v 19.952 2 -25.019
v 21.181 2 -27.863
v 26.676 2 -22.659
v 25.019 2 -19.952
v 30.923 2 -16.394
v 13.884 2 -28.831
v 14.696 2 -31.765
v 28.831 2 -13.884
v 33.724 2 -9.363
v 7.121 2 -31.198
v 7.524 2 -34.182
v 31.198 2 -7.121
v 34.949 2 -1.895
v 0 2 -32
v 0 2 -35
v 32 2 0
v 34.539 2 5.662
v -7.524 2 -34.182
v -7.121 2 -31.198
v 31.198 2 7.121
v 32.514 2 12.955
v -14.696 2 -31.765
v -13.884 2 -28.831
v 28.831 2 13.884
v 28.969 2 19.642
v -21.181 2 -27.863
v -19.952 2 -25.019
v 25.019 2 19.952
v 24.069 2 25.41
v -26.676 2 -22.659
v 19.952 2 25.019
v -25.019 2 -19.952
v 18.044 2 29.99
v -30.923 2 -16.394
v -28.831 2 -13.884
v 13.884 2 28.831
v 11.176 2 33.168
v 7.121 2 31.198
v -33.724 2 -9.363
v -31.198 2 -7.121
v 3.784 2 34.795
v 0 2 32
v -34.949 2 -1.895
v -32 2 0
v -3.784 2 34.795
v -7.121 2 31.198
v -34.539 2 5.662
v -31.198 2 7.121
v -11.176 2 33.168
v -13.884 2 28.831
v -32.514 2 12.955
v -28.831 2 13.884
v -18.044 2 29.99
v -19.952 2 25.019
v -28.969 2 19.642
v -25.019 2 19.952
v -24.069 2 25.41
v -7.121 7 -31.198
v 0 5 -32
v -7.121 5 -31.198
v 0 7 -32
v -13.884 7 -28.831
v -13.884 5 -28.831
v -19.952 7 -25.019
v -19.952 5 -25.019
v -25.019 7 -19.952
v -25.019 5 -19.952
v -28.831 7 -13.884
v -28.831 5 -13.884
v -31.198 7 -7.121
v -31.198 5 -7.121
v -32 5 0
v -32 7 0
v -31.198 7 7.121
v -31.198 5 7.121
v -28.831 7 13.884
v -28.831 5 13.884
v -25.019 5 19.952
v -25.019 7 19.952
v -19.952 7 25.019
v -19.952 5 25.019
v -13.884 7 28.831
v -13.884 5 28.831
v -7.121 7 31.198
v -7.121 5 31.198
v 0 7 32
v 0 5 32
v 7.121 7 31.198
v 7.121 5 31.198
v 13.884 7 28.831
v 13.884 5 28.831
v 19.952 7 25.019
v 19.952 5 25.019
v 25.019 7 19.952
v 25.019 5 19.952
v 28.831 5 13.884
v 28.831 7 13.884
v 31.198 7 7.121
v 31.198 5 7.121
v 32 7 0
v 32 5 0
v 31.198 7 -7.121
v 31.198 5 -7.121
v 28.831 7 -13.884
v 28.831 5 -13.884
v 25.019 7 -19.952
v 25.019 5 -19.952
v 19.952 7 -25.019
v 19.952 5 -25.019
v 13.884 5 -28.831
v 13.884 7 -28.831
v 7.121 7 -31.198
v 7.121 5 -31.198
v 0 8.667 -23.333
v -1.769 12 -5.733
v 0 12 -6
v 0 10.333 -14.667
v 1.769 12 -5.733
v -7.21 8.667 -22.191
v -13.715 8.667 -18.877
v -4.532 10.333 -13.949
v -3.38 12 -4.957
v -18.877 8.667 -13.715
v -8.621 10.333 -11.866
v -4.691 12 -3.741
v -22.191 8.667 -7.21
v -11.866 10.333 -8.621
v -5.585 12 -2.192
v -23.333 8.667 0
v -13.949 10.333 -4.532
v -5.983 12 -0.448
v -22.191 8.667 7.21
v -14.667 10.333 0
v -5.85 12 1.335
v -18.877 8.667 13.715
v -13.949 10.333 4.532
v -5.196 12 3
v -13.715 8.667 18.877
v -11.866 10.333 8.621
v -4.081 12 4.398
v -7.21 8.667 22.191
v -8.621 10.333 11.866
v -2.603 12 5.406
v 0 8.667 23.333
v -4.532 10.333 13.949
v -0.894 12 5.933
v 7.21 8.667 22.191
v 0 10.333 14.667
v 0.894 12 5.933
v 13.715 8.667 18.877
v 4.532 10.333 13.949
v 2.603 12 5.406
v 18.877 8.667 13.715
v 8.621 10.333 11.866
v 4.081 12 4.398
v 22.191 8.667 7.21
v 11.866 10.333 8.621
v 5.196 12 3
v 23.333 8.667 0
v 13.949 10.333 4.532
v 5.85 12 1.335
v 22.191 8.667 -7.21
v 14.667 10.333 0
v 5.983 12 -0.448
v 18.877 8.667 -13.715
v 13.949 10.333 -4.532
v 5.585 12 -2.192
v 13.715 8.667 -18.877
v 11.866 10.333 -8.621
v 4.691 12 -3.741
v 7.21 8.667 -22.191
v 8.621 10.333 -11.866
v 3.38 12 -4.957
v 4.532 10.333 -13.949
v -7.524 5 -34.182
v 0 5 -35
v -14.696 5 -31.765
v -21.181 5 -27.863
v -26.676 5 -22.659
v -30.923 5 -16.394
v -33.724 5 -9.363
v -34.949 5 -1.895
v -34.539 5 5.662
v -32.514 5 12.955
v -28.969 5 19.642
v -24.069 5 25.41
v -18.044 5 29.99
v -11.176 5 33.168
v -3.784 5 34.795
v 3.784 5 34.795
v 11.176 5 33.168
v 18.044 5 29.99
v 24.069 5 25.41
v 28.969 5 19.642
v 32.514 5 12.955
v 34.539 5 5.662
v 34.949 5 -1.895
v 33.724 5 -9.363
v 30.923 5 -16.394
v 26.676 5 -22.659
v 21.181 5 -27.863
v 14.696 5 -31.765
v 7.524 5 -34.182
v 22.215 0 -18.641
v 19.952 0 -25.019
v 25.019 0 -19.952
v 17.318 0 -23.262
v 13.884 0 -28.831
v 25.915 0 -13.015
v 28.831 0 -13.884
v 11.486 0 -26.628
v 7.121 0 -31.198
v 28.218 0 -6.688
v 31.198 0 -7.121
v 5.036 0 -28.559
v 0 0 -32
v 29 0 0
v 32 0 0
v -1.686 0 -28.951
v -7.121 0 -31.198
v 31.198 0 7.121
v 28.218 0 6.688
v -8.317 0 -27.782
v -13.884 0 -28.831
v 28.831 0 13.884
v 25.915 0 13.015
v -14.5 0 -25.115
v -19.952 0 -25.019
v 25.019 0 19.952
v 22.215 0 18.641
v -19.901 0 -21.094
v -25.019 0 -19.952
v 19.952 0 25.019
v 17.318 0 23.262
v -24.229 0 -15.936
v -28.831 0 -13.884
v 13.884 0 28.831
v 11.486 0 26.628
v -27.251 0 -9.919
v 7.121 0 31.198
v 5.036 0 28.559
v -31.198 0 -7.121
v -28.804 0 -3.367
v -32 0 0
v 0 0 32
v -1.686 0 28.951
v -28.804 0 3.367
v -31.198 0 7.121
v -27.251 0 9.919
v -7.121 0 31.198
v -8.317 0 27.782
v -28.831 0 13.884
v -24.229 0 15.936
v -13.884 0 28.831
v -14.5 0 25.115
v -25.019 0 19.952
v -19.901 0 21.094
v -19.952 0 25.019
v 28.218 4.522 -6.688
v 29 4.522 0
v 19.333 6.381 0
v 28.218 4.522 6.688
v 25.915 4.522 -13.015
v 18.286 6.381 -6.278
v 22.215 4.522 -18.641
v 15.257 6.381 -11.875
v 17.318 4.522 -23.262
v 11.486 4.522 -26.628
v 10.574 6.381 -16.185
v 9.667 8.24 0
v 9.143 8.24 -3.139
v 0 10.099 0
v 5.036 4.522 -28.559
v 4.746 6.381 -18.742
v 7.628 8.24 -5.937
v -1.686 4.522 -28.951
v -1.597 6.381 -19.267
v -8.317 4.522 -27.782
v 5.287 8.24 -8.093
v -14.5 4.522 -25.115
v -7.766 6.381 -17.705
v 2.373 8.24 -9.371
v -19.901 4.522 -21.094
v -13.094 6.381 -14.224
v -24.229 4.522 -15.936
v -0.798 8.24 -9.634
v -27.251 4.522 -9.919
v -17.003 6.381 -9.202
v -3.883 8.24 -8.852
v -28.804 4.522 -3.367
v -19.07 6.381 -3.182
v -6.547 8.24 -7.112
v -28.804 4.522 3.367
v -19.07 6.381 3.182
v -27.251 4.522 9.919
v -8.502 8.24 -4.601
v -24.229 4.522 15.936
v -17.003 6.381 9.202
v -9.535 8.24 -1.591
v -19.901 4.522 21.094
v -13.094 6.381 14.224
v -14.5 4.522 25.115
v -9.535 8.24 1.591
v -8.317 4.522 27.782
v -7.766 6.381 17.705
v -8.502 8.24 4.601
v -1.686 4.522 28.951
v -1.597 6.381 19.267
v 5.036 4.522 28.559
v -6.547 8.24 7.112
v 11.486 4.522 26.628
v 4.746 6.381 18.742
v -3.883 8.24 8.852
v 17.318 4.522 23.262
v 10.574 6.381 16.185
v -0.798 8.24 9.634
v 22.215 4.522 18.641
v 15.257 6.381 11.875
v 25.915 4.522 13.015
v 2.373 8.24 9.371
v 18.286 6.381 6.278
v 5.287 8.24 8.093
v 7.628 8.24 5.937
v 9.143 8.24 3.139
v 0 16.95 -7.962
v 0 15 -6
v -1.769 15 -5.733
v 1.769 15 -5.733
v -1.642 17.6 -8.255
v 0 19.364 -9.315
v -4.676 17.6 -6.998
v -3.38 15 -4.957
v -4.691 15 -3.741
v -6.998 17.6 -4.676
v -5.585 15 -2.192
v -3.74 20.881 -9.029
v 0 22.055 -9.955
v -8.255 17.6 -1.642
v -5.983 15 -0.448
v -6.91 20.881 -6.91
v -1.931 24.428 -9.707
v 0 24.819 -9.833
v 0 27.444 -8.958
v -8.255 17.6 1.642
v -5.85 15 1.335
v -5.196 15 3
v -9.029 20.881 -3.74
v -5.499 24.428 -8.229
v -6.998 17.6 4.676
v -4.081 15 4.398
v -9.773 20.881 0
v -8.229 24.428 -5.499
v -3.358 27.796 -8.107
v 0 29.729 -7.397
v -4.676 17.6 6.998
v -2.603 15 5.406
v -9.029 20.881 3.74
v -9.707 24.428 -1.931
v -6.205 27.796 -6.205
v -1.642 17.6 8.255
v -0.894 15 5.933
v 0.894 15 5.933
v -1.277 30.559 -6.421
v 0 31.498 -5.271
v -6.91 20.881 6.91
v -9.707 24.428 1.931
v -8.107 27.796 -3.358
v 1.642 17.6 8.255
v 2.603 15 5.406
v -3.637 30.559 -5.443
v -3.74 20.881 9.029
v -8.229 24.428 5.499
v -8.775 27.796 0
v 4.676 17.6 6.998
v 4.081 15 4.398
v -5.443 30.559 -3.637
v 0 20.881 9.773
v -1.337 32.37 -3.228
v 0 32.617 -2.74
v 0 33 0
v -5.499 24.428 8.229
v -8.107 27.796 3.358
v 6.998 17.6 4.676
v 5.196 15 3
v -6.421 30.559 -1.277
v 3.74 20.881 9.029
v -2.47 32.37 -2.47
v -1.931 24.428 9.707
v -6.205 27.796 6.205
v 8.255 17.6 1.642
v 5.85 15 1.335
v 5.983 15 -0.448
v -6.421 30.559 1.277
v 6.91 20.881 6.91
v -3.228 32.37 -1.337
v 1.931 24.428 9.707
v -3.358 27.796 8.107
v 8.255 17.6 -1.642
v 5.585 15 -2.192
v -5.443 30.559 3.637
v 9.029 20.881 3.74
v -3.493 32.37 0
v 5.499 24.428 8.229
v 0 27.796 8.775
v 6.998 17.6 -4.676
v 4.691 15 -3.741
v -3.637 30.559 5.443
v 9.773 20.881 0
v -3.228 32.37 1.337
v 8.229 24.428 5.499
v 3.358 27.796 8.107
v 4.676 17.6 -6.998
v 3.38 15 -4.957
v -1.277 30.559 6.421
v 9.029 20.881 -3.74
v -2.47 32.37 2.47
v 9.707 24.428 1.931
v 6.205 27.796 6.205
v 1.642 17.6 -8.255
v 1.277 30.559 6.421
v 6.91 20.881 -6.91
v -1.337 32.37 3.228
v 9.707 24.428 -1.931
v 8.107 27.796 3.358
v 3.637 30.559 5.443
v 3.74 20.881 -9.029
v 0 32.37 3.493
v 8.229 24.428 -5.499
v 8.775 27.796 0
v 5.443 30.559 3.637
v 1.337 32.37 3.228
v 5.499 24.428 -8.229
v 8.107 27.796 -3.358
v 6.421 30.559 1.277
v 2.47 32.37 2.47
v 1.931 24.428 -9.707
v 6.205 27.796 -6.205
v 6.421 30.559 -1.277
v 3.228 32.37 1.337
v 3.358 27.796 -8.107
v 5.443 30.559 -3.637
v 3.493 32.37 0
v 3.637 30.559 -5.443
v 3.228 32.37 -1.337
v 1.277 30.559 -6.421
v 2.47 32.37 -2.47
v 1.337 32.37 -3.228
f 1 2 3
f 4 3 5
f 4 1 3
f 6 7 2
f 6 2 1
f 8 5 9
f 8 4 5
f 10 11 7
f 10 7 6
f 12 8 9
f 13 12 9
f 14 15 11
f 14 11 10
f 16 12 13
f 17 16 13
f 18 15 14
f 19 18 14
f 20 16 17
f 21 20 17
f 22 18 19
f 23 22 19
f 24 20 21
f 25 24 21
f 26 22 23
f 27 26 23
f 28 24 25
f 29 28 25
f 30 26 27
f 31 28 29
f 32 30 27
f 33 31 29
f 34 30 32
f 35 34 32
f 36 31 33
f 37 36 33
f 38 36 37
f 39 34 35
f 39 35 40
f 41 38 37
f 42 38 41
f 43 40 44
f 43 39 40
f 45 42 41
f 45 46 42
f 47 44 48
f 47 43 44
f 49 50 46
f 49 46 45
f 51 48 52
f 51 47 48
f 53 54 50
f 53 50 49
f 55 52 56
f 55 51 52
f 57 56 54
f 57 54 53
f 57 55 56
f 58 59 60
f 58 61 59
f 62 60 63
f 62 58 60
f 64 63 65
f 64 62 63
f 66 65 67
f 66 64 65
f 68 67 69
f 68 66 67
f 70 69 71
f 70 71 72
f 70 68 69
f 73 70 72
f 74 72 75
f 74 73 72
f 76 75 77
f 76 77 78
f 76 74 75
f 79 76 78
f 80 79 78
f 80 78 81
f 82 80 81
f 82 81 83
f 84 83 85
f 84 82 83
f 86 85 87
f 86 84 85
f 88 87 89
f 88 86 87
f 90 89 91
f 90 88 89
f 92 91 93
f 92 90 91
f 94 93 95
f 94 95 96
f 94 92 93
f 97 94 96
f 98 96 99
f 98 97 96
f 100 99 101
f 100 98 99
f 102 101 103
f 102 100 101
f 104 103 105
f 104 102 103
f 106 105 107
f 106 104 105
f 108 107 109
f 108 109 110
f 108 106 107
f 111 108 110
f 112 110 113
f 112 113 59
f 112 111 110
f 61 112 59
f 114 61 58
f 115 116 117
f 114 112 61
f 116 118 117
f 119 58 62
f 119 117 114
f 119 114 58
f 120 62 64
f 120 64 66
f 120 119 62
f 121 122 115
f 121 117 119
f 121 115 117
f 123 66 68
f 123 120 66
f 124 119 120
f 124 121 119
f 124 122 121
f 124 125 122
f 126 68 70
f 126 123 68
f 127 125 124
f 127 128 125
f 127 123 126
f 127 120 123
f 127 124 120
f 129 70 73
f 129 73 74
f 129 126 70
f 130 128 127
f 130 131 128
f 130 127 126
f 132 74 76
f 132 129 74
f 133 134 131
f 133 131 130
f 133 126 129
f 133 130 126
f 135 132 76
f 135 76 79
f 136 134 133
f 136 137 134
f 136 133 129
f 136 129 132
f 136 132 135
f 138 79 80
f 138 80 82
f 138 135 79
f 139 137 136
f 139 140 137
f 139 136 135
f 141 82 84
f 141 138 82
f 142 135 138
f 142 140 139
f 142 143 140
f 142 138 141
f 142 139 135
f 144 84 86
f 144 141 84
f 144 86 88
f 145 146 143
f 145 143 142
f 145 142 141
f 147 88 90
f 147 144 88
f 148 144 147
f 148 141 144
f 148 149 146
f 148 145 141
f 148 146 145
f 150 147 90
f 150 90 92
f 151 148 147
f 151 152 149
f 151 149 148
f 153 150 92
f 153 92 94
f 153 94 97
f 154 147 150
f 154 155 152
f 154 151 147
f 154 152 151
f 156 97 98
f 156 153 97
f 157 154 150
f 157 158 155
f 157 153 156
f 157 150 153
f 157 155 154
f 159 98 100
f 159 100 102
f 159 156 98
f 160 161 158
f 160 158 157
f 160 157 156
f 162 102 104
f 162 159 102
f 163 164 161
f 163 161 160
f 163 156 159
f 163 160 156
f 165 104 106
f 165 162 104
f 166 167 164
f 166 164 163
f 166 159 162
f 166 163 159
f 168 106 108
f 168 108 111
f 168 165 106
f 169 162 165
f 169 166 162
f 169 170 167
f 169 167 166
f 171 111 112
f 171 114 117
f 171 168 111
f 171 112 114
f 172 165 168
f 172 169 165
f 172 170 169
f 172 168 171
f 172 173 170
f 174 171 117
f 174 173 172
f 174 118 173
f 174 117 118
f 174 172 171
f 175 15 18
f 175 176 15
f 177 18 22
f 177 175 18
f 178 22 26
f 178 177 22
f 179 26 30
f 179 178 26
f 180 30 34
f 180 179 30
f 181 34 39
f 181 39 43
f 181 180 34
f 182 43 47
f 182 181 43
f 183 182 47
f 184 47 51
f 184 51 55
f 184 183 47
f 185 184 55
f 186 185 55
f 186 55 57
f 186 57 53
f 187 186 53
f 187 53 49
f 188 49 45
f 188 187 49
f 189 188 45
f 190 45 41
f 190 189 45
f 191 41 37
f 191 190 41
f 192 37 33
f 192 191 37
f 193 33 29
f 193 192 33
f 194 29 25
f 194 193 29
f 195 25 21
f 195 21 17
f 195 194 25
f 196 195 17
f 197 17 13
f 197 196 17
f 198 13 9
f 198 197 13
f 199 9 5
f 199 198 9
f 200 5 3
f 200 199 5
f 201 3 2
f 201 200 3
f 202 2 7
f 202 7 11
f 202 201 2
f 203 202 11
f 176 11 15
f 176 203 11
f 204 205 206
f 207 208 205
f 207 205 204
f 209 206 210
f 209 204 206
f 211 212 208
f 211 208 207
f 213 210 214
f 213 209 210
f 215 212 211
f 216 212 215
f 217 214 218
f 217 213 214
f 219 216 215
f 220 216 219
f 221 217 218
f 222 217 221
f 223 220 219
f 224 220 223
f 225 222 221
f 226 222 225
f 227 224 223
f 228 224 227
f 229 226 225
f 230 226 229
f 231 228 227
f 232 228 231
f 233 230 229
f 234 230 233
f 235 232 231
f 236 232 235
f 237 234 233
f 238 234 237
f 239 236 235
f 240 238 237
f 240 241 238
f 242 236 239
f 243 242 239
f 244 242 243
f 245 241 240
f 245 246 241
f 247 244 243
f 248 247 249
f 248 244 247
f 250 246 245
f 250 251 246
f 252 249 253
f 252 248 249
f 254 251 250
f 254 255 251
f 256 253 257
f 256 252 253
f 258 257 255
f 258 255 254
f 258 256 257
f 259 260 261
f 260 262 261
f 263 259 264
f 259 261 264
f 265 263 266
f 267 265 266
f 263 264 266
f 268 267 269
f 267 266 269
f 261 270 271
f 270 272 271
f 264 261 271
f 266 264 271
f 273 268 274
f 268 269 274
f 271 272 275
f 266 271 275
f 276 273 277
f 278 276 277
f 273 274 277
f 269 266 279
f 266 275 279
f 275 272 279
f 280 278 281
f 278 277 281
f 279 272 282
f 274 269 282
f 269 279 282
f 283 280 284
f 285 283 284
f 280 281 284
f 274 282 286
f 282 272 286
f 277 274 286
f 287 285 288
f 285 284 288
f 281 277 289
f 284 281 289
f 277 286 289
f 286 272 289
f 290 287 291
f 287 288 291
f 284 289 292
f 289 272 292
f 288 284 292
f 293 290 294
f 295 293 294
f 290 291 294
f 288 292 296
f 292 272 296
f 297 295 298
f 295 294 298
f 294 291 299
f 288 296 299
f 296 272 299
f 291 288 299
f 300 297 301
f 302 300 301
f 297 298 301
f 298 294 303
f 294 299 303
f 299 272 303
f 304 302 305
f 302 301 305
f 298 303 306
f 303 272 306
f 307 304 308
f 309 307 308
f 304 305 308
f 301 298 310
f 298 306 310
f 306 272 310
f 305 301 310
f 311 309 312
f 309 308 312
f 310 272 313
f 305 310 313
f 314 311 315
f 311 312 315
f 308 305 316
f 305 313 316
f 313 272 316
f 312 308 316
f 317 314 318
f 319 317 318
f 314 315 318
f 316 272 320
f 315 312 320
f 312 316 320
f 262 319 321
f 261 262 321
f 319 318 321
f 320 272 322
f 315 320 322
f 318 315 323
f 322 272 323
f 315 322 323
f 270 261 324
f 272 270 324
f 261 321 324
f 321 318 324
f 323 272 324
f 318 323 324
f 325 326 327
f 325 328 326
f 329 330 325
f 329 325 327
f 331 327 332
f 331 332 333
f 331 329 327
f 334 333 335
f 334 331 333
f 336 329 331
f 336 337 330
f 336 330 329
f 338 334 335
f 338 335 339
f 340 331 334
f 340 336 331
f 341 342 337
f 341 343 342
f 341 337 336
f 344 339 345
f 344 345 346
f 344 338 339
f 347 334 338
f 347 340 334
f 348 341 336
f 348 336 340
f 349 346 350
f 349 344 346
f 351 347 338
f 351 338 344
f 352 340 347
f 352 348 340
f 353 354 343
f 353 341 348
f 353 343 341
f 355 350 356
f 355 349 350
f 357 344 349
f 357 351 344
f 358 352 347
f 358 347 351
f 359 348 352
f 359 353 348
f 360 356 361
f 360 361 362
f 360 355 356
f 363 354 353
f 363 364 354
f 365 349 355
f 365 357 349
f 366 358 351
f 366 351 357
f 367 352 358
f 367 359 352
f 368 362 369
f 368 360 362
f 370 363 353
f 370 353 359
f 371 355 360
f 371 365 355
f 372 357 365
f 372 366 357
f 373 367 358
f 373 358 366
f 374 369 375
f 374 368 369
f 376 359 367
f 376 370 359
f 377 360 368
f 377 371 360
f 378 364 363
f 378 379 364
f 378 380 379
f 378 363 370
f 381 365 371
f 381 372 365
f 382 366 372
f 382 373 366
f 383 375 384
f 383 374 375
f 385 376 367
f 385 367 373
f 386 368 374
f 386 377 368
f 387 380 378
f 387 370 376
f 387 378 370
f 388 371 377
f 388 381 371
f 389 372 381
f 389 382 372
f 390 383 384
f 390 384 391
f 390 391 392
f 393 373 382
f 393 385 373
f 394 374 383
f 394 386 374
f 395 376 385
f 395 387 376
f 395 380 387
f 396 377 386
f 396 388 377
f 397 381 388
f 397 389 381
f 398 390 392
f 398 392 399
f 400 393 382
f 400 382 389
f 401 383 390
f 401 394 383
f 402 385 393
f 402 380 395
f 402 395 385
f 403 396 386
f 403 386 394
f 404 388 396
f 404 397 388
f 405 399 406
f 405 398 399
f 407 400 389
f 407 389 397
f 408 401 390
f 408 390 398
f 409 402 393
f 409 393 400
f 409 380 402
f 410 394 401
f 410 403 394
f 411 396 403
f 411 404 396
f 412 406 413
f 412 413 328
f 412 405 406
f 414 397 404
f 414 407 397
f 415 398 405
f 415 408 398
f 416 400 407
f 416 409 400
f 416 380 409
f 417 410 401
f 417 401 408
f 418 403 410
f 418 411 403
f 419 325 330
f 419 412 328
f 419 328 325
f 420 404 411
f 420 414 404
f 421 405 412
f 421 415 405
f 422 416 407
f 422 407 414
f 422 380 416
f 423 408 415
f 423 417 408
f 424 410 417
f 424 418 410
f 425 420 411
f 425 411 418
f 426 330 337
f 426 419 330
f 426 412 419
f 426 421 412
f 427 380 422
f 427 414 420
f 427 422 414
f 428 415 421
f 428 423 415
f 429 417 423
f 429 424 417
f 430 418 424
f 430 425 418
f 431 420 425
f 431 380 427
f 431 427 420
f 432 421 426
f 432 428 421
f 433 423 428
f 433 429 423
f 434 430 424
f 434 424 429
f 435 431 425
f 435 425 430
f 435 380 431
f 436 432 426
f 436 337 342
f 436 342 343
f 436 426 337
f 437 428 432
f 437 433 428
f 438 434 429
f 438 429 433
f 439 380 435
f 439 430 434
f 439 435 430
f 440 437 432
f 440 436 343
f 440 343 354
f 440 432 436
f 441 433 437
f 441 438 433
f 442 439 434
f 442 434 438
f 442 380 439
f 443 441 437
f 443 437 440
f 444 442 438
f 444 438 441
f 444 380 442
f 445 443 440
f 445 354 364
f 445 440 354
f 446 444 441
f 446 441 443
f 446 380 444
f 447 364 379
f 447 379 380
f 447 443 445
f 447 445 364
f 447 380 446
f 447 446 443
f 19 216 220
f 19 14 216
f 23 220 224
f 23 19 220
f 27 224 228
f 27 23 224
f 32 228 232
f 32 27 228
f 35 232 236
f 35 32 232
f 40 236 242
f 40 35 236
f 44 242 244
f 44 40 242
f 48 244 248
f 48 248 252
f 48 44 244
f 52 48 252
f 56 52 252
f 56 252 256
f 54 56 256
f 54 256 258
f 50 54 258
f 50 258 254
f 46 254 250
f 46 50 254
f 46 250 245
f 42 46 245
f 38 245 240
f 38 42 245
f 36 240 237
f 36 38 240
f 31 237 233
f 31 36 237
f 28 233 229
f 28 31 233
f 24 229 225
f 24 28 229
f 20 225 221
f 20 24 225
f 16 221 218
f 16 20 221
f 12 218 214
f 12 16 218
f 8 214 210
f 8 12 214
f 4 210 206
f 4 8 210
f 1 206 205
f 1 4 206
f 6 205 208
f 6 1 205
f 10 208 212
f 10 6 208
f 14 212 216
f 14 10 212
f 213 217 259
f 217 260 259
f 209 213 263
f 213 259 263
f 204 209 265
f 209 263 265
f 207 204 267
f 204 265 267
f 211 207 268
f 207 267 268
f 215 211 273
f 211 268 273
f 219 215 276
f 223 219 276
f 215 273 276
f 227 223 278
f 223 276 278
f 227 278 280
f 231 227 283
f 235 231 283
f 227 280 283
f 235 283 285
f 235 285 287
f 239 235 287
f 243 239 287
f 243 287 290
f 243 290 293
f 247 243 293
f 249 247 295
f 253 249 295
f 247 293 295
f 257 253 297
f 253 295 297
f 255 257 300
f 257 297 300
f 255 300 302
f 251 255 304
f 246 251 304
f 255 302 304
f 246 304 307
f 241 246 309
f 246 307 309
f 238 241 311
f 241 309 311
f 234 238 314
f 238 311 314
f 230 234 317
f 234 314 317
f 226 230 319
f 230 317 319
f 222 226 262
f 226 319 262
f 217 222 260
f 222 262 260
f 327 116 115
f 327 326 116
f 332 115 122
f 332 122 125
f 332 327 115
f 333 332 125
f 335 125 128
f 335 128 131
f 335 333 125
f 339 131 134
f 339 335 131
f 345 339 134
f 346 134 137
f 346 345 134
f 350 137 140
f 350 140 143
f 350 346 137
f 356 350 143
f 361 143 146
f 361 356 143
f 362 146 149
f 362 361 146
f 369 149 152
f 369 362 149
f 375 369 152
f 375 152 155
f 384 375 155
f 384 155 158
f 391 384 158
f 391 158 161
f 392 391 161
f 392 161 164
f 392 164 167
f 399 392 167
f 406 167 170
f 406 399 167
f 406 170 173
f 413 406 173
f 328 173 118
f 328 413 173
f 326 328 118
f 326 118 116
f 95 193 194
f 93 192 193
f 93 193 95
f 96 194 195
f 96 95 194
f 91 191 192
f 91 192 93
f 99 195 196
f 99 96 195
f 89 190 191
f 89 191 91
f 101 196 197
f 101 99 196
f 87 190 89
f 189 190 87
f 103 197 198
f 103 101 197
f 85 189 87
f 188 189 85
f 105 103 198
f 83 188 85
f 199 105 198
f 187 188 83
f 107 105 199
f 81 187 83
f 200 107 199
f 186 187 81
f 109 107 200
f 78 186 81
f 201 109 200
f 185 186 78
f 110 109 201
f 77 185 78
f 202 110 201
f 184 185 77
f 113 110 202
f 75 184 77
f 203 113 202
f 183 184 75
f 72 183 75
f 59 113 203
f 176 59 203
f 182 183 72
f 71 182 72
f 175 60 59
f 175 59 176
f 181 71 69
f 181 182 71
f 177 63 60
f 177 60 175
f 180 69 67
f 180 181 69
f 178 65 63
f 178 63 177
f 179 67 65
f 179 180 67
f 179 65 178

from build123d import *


# Read off the part's stored shape, not the designer's step: 抽壳1
with BuildPart() as part:
    # 草图1 → 旋转1 (revolve)
    with BuildSketch(Plane.XY, mode=Mode.PRIVATE) as revolve_1_sk:
        with BuildLine():
            Line((0, 0), (32, 0))
            Line((32, 0), (32, 2))
            Line((32, 2), (35, 2))
            Line((35, 2), (35, 5))
            Line((35, 5), (32, 5))
            Line((32, 5), (32, 7))
            Line((32, 7), (6, 12))
            Line((6, 12), (6, 15))
            ThreePointArc((6, 15), (9.486832981, 26.16227766), (0, 33))
            Line((0, 33), (0, 0))
        make_face()
    revolve(revolve_1_sk.sketch.rotate(Axis((0, 0, 0), (0, 1, 0)), 90), axis=Axis((0, 0, 0), (0, 1, 0)))

    # 抽壳1 outline → 抽壳1 (revolve, cut)
    with BuildSketch(Plane.XY):
        Polygon((29, 0), (29, 4.521953317), (0, 10.098876393), (0, 0), align=None)
    revolve(axis=Axis((0, 0, 0), (0, 1, 0)), mode=Mode.SUBTRACT)


solid = part.part
